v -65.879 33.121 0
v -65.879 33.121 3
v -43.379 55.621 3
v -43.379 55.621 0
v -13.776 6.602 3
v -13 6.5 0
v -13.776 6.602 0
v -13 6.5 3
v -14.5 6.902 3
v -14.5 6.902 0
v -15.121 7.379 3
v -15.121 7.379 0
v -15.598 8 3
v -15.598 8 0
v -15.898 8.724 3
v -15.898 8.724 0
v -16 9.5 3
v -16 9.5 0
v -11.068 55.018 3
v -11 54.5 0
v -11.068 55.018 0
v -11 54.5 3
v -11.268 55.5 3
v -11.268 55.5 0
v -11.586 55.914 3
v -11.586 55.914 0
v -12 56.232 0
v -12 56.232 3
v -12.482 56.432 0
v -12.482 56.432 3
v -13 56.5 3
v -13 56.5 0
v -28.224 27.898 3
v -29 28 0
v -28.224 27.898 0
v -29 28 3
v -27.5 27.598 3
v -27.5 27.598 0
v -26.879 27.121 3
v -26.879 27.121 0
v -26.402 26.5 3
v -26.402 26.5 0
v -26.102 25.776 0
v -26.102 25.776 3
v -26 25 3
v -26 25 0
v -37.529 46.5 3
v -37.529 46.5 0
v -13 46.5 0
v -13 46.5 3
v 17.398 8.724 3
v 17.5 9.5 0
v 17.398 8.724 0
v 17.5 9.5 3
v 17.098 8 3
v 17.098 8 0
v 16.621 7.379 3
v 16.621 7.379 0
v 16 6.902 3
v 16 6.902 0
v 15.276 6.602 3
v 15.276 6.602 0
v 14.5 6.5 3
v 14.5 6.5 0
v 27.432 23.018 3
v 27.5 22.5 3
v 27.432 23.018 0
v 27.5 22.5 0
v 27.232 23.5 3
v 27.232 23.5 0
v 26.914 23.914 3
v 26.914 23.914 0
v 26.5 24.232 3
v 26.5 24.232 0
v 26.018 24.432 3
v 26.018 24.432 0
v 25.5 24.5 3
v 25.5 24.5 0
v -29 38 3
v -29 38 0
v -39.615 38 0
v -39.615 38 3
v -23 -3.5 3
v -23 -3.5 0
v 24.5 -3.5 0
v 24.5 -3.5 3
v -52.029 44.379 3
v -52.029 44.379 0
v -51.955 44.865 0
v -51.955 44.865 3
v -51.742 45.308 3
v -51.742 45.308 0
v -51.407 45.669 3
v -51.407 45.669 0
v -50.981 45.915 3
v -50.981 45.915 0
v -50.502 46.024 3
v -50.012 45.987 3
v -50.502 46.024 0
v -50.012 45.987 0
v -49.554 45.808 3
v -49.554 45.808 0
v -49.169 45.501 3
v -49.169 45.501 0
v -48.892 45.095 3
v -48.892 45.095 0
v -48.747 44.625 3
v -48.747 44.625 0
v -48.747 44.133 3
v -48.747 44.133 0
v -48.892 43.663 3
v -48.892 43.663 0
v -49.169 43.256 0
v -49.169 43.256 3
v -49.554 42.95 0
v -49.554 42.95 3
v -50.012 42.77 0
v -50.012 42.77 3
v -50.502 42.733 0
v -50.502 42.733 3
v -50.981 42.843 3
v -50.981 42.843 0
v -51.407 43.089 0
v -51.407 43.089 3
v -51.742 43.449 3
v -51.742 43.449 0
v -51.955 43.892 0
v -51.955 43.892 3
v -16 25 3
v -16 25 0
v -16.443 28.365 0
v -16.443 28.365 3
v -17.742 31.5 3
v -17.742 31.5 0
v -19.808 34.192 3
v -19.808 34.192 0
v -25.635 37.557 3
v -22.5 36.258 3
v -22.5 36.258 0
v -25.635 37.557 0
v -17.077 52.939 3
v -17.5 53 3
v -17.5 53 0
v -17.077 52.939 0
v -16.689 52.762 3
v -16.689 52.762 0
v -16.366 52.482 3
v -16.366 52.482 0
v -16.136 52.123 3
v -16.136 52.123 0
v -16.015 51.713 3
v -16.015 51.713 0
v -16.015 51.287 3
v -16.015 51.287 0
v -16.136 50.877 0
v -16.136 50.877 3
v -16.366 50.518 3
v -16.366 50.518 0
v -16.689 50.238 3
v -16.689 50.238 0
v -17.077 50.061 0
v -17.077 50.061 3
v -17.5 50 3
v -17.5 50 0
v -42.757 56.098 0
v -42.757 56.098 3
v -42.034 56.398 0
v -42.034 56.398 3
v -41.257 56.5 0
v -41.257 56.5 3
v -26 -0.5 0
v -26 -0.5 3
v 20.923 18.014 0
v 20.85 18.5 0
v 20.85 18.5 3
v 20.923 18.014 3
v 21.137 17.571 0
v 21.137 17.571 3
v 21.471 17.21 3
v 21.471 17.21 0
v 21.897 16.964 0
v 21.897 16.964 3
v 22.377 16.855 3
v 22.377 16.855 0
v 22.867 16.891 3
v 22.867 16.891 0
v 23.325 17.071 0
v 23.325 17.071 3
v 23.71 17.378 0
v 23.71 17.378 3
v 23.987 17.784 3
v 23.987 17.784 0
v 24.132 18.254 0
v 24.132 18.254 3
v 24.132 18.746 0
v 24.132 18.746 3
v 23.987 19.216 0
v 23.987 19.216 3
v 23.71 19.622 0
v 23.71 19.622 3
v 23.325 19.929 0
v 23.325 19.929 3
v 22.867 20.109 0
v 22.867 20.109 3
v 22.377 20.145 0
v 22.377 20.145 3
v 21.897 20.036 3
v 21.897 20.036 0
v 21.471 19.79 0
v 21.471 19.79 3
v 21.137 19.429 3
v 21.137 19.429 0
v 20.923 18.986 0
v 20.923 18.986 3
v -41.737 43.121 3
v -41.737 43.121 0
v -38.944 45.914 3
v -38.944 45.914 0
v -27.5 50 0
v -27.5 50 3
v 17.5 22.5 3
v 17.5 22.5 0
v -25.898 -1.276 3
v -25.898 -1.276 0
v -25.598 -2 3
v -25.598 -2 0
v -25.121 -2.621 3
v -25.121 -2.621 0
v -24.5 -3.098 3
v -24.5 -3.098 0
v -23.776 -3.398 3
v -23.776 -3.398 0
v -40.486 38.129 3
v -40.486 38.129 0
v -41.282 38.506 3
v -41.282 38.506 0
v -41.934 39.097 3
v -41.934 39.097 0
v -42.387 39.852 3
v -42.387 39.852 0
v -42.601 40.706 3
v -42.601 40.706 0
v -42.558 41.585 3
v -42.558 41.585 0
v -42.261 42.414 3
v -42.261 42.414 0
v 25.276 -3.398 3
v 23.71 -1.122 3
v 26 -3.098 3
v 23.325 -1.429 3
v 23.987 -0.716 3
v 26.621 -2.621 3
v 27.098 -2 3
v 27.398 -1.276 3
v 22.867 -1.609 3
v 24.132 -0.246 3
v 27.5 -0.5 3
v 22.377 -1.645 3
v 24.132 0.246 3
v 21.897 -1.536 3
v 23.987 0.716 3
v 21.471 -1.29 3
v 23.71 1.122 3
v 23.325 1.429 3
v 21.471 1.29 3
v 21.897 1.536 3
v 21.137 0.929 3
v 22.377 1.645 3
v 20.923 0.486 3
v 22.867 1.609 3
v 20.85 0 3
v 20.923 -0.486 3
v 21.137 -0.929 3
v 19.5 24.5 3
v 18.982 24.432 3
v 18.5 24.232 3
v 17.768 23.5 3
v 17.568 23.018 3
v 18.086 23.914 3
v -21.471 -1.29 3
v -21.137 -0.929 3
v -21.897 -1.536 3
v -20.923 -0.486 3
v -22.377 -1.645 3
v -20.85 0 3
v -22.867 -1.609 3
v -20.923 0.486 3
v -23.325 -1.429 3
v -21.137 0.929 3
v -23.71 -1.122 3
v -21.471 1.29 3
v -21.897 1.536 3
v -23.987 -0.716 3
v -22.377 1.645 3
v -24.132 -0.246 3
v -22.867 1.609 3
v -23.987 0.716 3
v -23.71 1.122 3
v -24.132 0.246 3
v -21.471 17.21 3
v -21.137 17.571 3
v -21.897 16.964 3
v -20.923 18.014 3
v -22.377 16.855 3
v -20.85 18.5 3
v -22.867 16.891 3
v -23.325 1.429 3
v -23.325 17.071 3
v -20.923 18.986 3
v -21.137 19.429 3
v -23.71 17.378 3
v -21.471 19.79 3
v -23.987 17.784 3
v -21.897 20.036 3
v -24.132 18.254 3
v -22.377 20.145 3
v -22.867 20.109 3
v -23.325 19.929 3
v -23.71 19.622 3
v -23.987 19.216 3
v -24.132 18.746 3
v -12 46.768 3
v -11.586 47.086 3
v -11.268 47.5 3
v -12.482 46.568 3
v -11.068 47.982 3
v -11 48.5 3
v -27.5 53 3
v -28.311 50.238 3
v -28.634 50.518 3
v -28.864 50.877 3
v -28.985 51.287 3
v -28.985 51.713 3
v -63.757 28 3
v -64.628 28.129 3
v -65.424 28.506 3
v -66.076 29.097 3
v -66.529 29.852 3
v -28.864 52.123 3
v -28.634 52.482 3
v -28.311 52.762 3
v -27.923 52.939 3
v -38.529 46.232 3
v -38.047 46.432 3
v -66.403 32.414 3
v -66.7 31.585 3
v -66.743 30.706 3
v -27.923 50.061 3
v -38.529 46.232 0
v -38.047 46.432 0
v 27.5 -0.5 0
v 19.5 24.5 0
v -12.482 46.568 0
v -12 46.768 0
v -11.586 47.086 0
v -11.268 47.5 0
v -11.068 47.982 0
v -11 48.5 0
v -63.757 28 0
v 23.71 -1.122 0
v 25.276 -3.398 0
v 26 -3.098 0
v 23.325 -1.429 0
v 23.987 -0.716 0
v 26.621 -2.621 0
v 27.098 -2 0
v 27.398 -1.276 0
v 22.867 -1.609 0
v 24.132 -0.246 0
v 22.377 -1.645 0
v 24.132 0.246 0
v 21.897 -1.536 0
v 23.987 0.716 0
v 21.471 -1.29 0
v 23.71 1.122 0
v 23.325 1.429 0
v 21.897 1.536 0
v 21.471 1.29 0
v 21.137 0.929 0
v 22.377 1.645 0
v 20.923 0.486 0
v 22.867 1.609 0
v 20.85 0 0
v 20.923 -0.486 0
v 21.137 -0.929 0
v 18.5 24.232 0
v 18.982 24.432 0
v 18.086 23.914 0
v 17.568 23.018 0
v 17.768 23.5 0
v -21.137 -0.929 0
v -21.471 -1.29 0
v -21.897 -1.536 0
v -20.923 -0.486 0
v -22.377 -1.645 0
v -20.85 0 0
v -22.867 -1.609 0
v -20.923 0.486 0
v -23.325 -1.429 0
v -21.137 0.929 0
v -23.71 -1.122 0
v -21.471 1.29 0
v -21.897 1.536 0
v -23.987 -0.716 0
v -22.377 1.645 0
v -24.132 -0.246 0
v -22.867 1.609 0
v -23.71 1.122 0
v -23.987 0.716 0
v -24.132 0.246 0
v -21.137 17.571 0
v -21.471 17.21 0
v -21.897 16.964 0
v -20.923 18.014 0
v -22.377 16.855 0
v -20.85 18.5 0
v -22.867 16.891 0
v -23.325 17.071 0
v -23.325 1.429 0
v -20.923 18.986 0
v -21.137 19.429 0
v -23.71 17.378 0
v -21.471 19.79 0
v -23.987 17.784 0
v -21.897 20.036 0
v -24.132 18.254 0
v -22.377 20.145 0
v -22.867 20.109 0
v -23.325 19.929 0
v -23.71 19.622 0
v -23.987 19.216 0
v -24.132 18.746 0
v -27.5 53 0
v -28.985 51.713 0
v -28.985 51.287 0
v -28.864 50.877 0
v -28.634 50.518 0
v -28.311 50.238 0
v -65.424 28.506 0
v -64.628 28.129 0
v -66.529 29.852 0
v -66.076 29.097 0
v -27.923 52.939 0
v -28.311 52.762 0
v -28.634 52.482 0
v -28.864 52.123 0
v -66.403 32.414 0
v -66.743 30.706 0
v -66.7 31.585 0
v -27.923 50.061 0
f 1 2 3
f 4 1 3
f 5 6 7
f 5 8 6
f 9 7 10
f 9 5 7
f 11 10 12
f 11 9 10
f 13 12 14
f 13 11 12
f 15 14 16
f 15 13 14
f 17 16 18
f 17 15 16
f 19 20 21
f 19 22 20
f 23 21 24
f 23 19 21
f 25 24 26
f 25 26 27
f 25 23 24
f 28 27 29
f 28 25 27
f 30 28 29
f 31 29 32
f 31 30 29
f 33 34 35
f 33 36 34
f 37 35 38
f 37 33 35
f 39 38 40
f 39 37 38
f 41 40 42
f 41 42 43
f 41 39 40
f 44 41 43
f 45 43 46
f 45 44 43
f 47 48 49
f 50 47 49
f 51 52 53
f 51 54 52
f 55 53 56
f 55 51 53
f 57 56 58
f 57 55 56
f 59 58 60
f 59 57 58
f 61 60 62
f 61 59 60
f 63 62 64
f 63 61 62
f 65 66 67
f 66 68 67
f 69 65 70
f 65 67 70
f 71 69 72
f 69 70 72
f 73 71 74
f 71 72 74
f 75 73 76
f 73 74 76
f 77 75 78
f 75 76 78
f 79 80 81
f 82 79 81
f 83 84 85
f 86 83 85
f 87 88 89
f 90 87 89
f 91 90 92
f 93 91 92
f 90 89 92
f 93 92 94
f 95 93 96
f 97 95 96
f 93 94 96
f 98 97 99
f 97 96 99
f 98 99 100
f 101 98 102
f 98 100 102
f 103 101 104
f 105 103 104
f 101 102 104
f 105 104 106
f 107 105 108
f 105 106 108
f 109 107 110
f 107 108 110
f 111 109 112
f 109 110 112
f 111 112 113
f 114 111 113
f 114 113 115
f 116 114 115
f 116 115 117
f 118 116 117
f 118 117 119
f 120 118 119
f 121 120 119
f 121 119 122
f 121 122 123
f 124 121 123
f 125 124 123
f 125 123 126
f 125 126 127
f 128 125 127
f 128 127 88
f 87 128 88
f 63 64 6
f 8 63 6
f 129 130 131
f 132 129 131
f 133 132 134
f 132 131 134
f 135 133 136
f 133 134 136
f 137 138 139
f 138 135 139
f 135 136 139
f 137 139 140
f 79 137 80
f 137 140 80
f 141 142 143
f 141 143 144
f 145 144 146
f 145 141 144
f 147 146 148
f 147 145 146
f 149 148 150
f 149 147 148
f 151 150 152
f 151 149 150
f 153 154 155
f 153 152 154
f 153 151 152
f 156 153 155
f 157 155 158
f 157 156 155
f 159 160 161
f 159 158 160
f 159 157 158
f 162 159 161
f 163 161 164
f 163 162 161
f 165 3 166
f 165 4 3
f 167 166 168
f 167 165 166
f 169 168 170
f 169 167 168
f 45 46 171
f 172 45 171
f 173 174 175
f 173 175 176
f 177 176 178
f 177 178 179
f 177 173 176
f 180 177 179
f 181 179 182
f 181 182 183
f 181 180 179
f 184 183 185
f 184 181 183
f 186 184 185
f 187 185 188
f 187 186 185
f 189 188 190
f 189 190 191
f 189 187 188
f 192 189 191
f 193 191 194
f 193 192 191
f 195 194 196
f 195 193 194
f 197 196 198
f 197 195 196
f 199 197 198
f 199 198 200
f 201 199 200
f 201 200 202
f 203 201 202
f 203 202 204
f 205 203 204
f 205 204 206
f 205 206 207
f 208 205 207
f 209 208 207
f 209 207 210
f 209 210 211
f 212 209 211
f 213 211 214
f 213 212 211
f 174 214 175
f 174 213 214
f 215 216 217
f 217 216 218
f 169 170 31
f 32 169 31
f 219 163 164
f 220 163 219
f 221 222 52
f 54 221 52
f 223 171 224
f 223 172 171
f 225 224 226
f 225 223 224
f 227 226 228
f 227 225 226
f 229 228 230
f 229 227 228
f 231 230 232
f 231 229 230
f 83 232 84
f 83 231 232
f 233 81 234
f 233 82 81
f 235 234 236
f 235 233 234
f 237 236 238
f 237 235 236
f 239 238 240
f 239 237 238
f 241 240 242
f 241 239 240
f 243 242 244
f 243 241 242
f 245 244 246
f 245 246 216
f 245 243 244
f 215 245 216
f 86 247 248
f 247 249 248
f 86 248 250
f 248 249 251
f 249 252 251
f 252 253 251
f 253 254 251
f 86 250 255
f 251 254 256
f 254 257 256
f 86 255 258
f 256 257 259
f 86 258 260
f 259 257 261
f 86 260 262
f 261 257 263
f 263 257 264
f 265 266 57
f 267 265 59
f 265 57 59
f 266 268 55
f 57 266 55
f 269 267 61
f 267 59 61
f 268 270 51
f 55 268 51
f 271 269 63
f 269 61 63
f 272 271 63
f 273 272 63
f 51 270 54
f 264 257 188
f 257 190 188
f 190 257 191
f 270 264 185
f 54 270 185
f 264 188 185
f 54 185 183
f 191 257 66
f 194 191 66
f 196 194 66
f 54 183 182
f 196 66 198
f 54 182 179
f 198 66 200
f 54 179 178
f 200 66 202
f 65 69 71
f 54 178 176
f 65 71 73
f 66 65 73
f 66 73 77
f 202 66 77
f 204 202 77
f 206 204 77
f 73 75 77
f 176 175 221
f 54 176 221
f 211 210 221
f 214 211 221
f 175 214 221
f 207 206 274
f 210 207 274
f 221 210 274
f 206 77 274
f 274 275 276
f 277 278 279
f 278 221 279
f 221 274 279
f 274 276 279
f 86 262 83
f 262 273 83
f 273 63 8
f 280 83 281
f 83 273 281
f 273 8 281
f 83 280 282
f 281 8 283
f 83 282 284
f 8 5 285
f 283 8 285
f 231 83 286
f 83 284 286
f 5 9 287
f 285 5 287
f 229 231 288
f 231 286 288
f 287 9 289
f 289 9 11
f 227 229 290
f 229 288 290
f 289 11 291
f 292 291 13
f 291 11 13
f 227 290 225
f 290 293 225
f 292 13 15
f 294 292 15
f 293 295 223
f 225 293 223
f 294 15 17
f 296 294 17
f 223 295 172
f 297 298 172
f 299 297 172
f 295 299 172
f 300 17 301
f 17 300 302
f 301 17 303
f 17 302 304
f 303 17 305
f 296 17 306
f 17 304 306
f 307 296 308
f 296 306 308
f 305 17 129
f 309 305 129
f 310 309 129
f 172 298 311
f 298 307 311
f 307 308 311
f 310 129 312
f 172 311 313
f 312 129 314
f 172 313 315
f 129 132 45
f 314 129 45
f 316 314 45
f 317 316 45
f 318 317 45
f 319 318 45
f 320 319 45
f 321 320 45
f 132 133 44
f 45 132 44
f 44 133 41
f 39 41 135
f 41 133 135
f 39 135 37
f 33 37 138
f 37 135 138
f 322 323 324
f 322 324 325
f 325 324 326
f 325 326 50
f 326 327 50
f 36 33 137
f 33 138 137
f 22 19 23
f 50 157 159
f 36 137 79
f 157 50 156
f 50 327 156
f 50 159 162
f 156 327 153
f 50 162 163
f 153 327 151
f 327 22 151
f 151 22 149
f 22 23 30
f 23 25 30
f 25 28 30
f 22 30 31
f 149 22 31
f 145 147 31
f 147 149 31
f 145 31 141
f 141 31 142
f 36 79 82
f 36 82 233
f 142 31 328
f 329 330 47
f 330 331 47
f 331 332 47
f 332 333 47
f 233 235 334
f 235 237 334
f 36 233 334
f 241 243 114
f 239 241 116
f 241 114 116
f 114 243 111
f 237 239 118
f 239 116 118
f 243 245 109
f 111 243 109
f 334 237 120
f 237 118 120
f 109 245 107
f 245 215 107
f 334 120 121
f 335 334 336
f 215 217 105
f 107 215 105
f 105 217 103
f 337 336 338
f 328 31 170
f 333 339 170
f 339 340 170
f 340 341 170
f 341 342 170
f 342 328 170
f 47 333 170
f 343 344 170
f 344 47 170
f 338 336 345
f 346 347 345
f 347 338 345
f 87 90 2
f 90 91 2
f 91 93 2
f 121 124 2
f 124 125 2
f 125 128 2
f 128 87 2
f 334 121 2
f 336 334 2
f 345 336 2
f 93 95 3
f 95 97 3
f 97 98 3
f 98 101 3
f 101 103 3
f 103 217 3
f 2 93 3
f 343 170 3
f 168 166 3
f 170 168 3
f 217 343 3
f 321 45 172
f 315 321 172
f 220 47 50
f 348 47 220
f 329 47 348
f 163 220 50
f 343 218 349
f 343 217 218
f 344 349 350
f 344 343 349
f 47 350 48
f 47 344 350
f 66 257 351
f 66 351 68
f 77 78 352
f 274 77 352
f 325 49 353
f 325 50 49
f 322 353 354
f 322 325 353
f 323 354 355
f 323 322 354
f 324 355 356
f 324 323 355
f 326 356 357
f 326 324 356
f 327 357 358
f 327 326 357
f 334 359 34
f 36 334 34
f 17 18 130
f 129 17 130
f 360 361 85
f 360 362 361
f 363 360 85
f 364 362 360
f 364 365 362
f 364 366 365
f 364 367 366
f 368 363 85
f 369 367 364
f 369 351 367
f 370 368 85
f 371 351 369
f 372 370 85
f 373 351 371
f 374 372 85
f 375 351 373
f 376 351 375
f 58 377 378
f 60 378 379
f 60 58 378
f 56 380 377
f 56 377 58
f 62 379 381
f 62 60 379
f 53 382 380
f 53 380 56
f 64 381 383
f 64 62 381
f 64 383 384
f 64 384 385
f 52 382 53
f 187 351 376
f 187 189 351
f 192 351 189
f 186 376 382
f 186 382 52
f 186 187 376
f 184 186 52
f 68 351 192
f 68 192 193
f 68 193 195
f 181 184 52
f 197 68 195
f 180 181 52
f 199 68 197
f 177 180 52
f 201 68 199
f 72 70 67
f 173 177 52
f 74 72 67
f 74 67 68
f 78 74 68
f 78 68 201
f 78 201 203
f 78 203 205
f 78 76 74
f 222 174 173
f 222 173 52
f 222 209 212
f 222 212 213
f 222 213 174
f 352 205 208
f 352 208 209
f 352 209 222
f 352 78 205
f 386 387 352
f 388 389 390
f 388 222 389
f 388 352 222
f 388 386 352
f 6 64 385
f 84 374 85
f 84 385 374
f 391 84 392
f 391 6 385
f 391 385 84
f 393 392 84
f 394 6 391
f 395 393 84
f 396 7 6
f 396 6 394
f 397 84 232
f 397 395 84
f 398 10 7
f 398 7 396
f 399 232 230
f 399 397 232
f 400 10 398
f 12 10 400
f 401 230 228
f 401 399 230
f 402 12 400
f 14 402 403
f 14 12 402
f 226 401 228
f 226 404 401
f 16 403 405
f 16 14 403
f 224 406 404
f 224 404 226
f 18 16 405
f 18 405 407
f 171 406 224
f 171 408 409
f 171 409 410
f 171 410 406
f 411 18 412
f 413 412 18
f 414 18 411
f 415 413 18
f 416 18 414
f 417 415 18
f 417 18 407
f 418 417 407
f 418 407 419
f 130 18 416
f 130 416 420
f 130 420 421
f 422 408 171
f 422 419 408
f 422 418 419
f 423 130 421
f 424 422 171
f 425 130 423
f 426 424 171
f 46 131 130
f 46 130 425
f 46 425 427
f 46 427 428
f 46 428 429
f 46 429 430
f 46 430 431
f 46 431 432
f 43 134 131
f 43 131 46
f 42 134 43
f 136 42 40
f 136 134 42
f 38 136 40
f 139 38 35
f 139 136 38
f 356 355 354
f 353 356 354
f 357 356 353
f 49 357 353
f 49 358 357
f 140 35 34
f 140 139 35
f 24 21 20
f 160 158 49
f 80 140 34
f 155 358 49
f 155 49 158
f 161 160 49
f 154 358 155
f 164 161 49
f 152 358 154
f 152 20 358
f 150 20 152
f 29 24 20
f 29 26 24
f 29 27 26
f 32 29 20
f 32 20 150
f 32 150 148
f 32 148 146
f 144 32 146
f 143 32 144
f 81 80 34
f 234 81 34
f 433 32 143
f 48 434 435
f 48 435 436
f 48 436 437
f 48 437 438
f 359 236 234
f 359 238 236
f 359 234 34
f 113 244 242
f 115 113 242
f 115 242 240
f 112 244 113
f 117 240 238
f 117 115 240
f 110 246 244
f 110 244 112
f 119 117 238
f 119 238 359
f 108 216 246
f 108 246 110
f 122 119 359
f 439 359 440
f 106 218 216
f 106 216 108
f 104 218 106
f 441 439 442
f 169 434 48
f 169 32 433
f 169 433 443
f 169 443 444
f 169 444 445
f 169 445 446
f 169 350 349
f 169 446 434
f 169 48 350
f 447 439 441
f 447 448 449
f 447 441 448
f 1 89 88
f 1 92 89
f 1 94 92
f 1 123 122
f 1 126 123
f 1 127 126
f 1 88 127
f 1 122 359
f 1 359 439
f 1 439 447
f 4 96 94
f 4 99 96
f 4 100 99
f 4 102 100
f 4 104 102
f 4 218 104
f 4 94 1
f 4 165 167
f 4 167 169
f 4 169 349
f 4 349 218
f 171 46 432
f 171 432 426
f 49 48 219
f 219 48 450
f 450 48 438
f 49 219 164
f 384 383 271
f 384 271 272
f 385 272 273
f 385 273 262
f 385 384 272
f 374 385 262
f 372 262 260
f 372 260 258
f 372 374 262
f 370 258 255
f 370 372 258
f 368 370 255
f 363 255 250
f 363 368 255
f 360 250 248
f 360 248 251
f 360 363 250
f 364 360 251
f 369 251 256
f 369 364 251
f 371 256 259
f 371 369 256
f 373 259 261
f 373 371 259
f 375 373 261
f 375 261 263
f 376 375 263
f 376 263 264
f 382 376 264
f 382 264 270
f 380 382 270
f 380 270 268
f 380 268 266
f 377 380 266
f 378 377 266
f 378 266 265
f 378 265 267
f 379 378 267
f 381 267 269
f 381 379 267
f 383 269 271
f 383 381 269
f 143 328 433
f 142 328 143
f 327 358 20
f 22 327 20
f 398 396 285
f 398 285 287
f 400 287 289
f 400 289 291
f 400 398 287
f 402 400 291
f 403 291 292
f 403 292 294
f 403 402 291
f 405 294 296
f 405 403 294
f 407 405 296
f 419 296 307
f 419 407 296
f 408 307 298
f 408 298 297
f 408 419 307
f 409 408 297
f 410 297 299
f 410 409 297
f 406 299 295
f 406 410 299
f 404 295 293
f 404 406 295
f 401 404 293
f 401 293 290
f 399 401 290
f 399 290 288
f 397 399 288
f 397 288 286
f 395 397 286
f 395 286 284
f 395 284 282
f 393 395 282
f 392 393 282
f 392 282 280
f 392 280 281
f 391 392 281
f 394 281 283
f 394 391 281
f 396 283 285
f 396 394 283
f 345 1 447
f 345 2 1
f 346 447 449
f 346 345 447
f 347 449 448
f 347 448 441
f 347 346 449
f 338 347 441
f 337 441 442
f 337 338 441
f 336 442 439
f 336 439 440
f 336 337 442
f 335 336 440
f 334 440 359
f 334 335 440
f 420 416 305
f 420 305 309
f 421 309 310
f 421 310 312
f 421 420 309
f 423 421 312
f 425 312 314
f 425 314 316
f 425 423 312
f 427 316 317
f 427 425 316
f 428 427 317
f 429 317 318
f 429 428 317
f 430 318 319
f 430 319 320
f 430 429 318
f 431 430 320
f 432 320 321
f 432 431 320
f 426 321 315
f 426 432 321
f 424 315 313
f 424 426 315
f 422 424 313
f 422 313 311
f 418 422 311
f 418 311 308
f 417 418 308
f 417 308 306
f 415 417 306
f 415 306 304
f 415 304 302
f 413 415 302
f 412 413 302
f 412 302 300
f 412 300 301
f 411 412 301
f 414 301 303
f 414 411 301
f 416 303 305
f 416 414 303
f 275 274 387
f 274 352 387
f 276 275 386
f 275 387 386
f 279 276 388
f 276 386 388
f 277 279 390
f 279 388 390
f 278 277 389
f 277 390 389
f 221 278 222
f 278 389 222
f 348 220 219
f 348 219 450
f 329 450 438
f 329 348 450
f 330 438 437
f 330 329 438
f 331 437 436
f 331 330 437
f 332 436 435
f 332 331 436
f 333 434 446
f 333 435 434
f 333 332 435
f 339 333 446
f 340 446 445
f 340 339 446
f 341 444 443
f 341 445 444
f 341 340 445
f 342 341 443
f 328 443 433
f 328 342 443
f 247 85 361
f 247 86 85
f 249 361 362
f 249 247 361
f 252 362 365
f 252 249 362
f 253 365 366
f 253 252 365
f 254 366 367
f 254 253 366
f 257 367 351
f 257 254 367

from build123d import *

# Parameters (mm, degrees)
SKETCH_1_W          = 55
SKETCH_1_H          = 30
SKETCH_1_R          = 1.65
EXTRUDE_1_DEPTH     = 3
SKETCH_2_W          = 55
SKETCH_2_H          = 30
EXTRUDE_2_DEPTH     = 3
EXTRUDE_3_DEPTH     = 3
SKETCH_8_R          = 1.65
CUT_EXTRUDE_1_DEPTH = 10
FILLET_2_R          = 3
CUT_EXTRUDE_2_DEPTH = 10
CUT_EXTRUDE_3_DEPTH = 92.964667128
FILLET_3_R          = 3
CUT_EXTRUDE_4_DEPTH = 88.508828254
FILLET_4_R          = 3
SKETCH_14_W         = 50
SKETCH_14_H         = 32
CUT_EXTRUDE_5_DEPTH = 88.508828254
FILLET_5_R          = 2


with BuildPart() as part:
    # 草图1 → 凸台-拉伸1 (new body)
    with BuildSketch(Plane.XY):
        with Locations((0, 11.5)):
            Rectangle(SKETCH_1_W, SKETCH_1_H)
        with Locations((-22.5, 0)):
            Circle(SKETCH_1_R, mode=Mode.SUBTRACT)
        with Locations((-22.5, 18.5)):
            Circle(SKETCH_1_R, mode=Mode.SUBTRACT)
        with Locations(Location((22.5, 18.5, 0), (0, 0, 180))):
            Circle(SKETCH_1_R, mode=Mode.SUBTRACT)
        with Locations(Location((22.5, 0, 0), (0, 0, 180))):
            Circle(SKETCH_1_R, mode=Mode.SUBTRACT)
    extrude(amount=EXTRUDE_1_DEPTH)

    # 草图2 → 凸台-拉伸2 (add)
    with BuildSketch(Plane.XY.offset(3)):
        with Locations((0, 41.5)):
            Rectangle(SKETCH_2_W, SKETCH_2_H)
    extrude(amount=-EXTRUDE_2_DEPTH)

    # 草图4 → 凸台-拉伸3 (add)
    with BuildSketch(Plane.XY.offset(3)):
        Polygon((-27.5, 26.5), (-72.5, 26.5), (-42.5, 56.5), (-27.5, 56.5), align=None)
    extrude(amount=-EXTRUDE_3_DEPTH)

    # 草图8 → 切除-拉伸1 (cut)
    with BuildSketch(Plane(origin=(0, 0, 0), x_dir=(-1, 0, 0), z_dir=(0, 0, -1))):
        with Locations((50.378679656, 44.378679656)):
            Circle(SKETCH_8_R)
    extrude(amount=-CUT_EXTRUDE_1_DEPTH, mode=Mode.SUBTRACT)

    # 圆角2
    fillet_2_edges = [part.edges().sort_by_distance(p)[0] for p in [
        (27.5, 56.5, 1.5),
        (-42.5, 56.5, 1.5),
        (27.5, -3.5, 1.5),
    ]]
    fillet(fillet_2_edges, radius=FILLET_2_R)

    # 草图9 → 切除-拉伸2 (cut)
    with BuildSketch(Plane.XY.offset(3)):
        with BuildLine():
            Line((-27.5, 53), (-17.5, 53))
            ThreePointArc((-17.5, 53), (-16, 51.5), (-17.5, 50))
            Line((-17.5, 50), (-27.5, 50))
            ThreePointArc((-27.5, 50), (-29, 51.5), (-27.5, 53))
        make_face()
    extrude(amount=-CUT_EXTRUDE_2_DEPTH, mode=Mode.SUBTRACT)

    # 草图12 → 切除-拉伸3 (cut, through all)
    with BuildSketch(Plane(origin=(0, 0, 0), x_dir=(-1, 0, 0), z_dir=(0, 0, -1))):
        Polygon((71, 28), (26, 28), (26, -3.5), (27.5, -3.5), (27.5, 26.5), (72.5, 26.5), align=None)
    extrude(amount=-CUT_EXTRUDE_3_DEPTH, mode=Mode.SUBTRACT)

    # 圆角3
    fillet_3_edges = [part.edges().sort_by_distance(p)[0] for p in [
        (-26, -3.5, 1.5),
        (-26, 28, 1.5),
        (-71, 28, 1.5),
    ]]
    fillet(fillet_3_edges, radius=FILLET_3_R)

    # 草图13 → 切除-拉伸4 (cut, through all)
    with BuildSketch(Plane(origin=(0, 0, 0), x_dir=(-1, 0, 0), z_dir=(0, 0, -1))):
        with BuildLine():
            Line((29, 38), (46.857864376, 38))
            Line((46.857864376, 38), (38.357864376, 46.5))
            Line((38.357864376, 46.5), (-17.5, 46.5))
            Line((-17.5, 46.5), (-17.5, 6.5))
            Line((-17.5, 6.5), (16, 6.5))
            Line((16, 6.5), (16, 25))
            ThreePointArc((16, 25), (19.807611845, 34.192388155), (29, 38))
        make_face()
    extrude(amount=-CUT_EXTRUDE_4_DEPTH, mode=Mode.SUBTRACT)

    # 圆角4
    fillet_4_edges = [part.edges().sort_by_distance(p)[0] for p in [
        (-16, 6.5, 1.5),
        (17.5, 6.5, 1.5),
        (17.5, 46.5, 1.5),
        (-46.857864376, 38, 1.5),
    ]]
    fillet(fillet_4_edges, radius=FILLET_4_R)

    # 草图14 → 切除-拉伸5 (cut, through all)
    with BuildSketch(Plane(origin=(0, 0, 0), x_dir=(-1, 0, 0), z_dir=(0, 0, -1))):
        with Locations((-14, 40.5)):
            Rectangle(SKETCH_14_W, SKETCH_14_H)
    extrude(amount=-CUT_EXTRUDE_5_DEPTH, mode=Mode.SUBTRACT)

    # 圆角5
    fillet_5_edges = [part.edges().sort_by_distance(p)[0] for p in [
        (-38.357864376, 46.5, 1.5),
        (-11, 46.5, 1.5),
        (17.5, 24.5, 1.5),
        (27.5, 24.5, 1.5),
        (-11, 56.5, 1.5),
    ]]
    fillet(fillet_5_edges, radius=FILLET_5_R)


solid = part.part
